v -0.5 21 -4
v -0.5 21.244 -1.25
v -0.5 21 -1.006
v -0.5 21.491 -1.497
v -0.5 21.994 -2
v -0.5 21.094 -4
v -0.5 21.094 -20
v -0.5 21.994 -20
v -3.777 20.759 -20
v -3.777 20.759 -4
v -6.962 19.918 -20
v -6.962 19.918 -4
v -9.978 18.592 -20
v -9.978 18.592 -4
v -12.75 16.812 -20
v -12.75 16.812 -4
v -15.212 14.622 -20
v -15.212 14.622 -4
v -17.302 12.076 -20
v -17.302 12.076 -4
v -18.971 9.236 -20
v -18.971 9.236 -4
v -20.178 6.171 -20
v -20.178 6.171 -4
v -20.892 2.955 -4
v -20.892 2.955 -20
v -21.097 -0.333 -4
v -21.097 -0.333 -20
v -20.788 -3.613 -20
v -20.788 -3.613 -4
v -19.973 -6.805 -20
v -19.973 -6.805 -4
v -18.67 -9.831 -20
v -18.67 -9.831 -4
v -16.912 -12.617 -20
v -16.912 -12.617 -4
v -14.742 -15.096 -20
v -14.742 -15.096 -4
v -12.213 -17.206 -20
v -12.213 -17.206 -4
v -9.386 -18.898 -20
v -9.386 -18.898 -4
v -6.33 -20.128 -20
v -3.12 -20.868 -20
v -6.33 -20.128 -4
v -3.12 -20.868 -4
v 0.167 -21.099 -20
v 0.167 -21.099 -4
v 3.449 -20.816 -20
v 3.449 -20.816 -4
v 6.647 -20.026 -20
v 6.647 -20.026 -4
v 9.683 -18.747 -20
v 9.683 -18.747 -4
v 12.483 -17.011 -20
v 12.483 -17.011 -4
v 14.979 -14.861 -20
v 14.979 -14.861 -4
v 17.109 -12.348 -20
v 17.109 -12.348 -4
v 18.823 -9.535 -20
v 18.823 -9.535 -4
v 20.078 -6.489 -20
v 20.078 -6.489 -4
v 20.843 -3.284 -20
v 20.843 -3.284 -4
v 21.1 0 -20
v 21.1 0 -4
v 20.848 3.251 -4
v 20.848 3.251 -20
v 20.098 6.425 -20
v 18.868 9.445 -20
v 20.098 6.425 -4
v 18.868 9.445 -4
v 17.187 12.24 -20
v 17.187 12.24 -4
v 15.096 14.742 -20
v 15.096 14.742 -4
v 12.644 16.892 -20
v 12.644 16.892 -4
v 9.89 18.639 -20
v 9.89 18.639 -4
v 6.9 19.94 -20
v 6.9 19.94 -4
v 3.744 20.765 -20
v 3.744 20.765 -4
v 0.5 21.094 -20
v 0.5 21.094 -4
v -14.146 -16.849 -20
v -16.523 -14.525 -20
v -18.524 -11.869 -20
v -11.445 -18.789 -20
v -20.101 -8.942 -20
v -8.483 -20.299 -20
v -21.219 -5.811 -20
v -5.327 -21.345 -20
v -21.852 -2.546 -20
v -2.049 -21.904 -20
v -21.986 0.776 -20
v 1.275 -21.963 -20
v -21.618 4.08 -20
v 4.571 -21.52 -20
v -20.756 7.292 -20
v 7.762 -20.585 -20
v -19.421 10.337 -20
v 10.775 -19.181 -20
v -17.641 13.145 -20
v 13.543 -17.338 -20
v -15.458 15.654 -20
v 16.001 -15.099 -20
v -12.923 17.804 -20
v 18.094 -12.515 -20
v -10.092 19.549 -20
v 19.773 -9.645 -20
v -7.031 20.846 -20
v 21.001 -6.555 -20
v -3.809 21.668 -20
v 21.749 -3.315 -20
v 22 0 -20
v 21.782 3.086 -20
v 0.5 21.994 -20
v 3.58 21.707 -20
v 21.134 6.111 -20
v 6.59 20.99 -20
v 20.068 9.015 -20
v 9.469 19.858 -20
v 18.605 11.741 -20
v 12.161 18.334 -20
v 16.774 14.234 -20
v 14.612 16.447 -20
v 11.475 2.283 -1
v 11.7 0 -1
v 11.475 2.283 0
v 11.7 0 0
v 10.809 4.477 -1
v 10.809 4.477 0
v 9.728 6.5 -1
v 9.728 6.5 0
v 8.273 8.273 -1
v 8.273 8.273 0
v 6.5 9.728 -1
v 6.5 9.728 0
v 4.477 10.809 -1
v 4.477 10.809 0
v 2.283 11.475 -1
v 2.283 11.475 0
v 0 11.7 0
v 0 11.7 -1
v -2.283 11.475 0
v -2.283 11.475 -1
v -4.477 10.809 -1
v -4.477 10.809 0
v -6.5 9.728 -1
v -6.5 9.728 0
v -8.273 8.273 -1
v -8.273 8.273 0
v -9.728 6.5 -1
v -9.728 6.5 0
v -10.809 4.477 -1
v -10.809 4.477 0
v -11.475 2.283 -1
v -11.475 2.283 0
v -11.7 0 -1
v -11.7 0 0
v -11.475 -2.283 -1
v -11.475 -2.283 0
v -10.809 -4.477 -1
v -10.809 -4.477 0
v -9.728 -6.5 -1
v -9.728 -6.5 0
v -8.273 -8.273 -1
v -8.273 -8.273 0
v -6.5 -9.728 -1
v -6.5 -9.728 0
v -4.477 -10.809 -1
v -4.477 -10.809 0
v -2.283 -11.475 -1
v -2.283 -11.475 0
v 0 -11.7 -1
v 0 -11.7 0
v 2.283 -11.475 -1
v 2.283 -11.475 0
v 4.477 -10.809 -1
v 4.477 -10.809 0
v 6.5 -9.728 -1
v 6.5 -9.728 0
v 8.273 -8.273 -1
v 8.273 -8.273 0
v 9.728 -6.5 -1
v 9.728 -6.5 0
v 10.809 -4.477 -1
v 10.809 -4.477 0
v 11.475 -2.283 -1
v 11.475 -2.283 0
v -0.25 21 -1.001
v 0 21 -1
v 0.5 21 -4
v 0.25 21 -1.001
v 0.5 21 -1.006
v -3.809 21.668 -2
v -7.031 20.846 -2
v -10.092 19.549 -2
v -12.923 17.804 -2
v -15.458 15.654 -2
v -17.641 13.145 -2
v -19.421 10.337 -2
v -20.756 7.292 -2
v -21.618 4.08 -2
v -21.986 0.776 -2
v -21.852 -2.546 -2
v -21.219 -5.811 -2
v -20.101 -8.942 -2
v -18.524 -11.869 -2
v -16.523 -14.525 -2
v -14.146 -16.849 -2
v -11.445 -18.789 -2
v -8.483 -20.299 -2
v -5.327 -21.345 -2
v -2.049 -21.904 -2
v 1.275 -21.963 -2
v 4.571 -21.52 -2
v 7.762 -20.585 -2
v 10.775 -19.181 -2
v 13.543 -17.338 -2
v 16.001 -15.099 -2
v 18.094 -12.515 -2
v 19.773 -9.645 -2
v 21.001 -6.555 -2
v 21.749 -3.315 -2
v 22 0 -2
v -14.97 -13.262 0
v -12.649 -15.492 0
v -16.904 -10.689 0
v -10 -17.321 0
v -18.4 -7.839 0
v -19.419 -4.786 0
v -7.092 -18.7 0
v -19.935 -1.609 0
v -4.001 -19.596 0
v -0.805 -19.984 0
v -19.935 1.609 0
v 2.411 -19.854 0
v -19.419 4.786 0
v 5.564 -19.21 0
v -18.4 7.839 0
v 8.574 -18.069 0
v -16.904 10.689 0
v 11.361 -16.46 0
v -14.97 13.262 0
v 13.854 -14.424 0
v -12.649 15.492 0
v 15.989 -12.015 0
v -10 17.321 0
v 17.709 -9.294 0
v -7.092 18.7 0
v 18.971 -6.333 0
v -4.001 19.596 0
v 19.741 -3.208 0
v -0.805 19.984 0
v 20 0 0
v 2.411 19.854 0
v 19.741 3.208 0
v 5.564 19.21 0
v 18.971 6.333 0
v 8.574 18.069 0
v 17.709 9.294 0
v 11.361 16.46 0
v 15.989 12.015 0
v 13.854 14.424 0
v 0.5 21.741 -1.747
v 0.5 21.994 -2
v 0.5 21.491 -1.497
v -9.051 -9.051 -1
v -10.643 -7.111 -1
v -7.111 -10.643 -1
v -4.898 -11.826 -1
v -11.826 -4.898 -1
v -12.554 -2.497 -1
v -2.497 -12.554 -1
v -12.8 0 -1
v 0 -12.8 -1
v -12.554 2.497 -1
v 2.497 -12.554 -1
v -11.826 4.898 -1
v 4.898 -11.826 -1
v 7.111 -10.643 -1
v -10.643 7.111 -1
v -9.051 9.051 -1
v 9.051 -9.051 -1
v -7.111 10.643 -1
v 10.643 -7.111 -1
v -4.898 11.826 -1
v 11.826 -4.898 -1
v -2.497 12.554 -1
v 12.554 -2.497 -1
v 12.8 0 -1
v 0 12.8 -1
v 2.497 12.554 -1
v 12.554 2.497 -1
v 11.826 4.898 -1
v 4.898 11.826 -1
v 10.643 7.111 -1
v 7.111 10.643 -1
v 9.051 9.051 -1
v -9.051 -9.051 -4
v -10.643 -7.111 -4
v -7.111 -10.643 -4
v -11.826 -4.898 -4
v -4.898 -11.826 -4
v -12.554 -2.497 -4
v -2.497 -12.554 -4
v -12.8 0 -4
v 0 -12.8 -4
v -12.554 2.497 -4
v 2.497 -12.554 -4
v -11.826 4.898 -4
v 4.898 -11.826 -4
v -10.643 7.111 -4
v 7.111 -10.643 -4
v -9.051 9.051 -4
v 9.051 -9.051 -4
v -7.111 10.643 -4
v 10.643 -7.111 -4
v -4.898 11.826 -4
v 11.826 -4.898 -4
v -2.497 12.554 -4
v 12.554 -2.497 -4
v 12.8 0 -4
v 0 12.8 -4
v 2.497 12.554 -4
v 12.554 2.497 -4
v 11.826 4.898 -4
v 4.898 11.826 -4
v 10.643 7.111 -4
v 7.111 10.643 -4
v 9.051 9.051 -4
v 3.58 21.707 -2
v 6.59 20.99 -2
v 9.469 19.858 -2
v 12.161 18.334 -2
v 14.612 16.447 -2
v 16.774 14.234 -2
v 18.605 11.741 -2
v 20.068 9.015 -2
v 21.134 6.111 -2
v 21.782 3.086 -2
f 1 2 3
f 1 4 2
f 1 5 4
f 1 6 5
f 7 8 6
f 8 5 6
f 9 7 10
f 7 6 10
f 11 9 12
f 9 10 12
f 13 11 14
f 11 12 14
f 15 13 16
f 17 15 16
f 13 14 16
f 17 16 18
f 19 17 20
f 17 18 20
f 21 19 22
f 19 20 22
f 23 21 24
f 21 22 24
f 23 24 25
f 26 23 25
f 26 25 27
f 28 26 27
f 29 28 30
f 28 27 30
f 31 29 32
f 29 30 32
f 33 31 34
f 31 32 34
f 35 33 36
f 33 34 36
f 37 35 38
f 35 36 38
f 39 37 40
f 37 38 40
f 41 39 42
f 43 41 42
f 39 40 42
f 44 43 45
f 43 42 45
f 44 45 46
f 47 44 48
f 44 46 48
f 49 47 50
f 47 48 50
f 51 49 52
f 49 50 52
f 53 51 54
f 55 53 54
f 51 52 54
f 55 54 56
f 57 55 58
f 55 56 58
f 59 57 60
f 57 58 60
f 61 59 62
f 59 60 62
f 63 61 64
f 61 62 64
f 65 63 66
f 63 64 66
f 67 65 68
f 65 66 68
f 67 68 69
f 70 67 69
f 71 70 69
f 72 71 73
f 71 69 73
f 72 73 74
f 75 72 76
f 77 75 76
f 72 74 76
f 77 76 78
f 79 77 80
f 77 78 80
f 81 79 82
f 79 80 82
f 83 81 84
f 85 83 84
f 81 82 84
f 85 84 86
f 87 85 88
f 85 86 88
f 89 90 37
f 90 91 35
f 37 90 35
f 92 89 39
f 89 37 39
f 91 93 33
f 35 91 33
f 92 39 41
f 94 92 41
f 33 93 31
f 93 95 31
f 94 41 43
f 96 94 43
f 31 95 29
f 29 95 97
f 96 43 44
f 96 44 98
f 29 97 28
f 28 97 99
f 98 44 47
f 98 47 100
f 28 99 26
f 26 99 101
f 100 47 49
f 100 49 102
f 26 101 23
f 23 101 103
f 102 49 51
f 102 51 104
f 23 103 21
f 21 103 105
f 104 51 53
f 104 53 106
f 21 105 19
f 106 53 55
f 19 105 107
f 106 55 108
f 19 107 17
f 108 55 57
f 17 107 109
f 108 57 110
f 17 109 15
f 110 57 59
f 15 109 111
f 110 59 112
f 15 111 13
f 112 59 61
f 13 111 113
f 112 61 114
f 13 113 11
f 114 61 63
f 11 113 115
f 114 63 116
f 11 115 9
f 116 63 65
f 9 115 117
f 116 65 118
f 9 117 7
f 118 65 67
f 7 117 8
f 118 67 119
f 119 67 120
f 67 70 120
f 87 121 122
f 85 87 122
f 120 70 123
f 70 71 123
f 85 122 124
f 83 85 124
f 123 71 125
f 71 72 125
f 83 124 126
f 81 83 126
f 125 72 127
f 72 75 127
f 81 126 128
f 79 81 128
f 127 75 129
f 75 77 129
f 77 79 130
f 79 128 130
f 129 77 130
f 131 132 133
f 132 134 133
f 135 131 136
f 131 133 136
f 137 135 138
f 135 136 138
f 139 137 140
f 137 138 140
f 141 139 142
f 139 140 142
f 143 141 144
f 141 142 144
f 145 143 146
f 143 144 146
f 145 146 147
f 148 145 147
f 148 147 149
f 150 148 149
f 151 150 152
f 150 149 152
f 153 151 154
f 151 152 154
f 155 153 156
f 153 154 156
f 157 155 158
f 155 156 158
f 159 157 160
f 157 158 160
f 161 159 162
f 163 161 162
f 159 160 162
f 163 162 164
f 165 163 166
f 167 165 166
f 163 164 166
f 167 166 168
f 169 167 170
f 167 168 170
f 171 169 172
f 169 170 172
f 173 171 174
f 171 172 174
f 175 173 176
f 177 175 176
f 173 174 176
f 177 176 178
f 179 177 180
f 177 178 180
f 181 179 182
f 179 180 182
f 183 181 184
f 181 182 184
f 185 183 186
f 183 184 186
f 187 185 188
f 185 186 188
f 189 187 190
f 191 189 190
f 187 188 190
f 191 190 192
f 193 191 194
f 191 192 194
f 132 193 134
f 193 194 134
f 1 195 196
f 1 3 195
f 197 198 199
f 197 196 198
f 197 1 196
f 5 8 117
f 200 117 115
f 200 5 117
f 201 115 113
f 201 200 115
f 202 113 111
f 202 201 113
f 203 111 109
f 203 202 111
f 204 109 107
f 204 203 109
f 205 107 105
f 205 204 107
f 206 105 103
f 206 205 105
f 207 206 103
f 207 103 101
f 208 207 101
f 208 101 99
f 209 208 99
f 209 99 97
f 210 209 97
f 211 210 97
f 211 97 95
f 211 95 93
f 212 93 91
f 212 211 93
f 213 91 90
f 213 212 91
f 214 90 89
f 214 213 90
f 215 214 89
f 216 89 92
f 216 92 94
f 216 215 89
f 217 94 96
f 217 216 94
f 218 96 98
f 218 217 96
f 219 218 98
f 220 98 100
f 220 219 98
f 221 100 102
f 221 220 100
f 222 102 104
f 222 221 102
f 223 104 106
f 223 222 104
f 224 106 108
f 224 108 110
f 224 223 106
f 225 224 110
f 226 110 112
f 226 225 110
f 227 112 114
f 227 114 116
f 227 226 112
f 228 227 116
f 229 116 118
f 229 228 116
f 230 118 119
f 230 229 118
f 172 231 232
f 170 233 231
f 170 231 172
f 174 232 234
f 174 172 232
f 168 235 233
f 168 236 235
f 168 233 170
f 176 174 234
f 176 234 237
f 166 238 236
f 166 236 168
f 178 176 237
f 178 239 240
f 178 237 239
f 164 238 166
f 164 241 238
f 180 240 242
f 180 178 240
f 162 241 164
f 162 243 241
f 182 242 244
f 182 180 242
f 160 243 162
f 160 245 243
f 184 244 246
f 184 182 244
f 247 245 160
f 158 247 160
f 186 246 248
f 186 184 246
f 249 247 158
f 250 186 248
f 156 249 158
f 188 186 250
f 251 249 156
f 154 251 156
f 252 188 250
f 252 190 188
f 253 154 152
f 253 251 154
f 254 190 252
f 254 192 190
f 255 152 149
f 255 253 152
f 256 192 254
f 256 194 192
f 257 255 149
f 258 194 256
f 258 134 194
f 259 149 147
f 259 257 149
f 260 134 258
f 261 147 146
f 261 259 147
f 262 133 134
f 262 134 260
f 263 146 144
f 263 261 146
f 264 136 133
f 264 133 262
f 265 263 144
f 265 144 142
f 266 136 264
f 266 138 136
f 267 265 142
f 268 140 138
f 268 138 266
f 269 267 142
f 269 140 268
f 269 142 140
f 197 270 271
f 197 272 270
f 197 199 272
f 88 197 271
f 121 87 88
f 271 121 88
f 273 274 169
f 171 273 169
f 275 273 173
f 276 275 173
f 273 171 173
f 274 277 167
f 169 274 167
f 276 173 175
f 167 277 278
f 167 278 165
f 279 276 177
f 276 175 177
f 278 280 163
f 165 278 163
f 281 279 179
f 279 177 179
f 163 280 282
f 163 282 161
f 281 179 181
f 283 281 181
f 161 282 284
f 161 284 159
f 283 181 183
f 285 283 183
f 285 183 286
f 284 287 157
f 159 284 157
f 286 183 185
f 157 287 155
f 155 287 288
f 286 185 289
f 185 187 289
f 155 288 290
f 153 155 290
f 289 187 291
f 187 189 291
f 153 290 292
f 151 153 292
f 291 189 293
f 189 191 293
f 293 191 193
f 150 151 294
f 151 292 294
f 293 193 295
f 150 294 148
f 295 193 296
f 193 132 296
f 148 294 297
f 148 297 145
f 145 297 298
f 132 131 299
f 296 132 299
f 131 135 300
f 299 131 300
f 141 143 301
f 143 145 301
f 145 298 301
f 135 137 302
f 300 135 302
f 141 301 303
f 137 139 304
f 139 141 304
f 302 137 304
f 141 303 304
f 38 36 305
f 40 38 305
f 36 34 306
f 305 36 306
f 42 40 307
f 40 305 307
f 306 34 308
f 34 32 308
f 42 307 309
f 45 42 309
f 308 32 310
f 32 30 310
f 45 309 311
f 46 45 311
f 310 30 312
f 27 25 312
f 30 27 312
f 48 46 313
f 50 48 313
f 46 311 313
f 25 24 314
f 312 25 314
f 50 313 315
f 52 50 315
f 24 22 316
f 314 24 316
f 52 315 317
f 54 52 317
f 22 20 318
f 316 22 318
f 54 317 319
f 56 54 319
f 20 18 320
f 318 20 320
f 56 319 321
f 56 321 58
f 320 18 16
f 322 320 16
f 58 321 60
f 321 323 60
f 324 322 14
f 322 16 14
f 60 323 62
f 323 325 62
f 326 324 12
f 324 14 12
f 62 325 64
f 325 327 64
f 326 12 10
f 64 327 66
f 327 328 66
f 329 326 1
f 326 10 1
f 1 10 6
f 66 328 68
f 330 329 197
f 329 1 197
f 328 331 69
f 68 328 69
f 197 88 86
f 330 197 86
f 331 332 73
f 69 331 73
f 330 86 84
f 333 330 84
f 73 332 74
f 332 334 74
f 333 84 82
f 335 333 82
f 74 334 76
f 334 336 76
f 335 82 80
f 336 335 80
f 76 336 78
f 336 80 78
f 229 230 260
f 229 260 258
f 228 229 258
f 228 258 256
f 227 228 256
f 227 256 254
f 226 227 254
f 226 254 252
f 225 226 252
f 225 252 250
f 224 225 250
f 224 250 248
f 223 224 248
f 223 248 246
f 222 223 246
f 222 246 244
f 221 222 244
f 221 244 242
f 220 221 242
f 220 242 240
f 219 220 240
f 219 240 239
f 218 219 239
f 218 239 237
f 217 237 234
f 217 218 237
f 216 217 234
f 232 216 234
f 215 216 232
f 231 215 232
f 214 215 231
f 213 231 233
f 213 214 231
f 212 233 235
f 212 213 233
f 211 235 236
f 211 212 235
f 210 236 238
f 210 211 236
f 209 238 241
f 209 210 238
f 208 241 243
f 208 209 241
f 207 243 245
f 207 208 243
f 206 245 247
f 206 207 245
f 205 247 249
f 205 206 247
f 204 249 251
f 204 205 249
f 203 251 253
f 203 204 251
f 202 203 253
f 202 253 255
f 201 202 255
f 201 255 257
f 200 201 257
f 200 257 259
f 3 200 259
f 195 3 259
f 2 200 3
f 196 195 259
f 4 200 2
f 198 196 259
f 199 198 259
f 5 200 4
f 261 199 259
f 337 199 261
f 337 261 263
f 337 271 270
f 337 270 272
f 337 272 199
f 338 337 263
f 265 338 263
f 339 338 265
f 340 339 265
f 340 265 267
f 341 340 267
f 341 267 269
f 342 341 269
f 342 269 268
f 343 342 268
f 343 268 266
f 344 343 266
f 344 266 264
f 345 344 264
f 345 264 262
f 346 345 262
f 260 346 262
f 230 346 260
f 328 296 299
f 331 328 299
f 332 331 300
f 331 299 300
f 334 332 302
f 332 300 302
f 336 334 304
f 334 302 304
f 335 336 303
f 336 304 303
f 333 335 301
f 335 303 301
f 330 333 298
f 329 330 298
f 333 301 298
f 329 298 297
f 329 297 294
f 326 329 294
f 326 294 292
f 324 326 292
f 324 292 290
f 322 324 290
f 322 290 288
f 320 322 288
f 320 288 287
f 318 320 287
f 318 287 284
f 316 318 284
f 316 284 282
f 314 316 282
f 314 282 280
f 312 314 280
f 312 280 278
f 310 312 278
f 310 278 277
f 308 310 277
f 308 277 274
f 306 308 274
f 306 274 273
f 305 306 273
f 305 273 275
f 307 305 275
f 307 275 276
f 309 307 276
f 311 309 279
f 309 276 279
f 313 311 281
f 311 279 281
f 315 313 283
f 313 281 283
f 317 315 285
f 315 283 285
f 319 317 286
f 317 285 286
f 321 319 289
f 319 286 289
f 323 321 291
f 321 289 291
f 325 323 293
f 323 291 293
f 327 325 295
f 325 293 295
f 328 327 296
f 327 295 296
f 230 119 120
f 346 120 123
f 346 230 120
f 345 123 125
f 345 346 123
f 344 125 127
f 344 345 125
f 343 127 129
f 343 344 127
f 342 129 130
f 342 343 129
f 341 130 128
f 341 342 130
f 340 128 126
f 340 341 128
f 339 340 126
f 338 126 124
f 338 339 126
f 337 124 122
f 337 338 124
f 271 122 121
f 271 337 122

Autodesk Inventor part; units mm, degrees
ref_plane "YZ Plane" through (0, 0, 0) normal (1, 0, 0) x (0, 1, 0)
ref_plane "XZ Plane" through (0, 0, 0) normal (0, 1, 0) x (-1, 0, 0)
ref_plane "XY Plane" through (0, 0, 0) normal (0, 0, 1) x (1, 0, 0)
sketch "Sketch1" plane through (0, 0, 0) normal (0, 0, 1) x (1, 0, 0)
  circle A0 centre (0, 0) radius 21.1
  circle A1 centre (0, 0) radius 22
  circle A2 centre (0, 0) radius 12.8
  circle A3 centre (0, 0) radius 11.7
  circle A4 centre (0, 22) radius 0.5
  dimension "d1" = 44
  dimension "d0" = 42.2
  dimension "d2" = 25.6
  dimension "d3" = 23.4
  dimension "d13" = 1
extrude "Extrusion1" add sketch "Sketch1" against normal blind 4 contours A0
extrude "Extrusion2" add sketch "Sketch1" against normal blind 20 contours A1 A4 | A4 A1 picked at (5.1126, 20.6747) picked at (0.0199, 21.8341)
extrude "Extrusion3" add sketch "Sketch1" against normal blind 1 contours A2
chamfer "Chamfer1" distance 2 angle 45 1 edges at (-22, 0, 0)
sketch "Sketch2" plane through (0, 0, -20) normal (0, 0, -1) x (-1, 0, 0)
  circle A0 centre (0, 0) radius 22 projected
  line L0 (0.5, 21) -> (-0.5, 21)
  line L1 (-0.5, 21) -> (-0.5, 23)
  line L2 (-0.5, 23) -> (0.5, 23)
  line L3 (0.5, 23) -> (0.5, 21)
  line L4 (0.5, 21) -> (-0.5, 23) construction
  line L5 (-0.5, 21) -> (0.5, 23) construction
  point P0 (0, 22)
  dimension "d15" = 1
  dimension "d16" = 2
extrude "Extrusion4" cut sketch "Sketch2" against normal blind 20 contours L3 L0 L1 A0 | A0 L1 L2 L3 picked at (-0.0556, 21.3331)
properties part number "PolarizerObjectiveCap-MitutoyoPlanApoBD"
